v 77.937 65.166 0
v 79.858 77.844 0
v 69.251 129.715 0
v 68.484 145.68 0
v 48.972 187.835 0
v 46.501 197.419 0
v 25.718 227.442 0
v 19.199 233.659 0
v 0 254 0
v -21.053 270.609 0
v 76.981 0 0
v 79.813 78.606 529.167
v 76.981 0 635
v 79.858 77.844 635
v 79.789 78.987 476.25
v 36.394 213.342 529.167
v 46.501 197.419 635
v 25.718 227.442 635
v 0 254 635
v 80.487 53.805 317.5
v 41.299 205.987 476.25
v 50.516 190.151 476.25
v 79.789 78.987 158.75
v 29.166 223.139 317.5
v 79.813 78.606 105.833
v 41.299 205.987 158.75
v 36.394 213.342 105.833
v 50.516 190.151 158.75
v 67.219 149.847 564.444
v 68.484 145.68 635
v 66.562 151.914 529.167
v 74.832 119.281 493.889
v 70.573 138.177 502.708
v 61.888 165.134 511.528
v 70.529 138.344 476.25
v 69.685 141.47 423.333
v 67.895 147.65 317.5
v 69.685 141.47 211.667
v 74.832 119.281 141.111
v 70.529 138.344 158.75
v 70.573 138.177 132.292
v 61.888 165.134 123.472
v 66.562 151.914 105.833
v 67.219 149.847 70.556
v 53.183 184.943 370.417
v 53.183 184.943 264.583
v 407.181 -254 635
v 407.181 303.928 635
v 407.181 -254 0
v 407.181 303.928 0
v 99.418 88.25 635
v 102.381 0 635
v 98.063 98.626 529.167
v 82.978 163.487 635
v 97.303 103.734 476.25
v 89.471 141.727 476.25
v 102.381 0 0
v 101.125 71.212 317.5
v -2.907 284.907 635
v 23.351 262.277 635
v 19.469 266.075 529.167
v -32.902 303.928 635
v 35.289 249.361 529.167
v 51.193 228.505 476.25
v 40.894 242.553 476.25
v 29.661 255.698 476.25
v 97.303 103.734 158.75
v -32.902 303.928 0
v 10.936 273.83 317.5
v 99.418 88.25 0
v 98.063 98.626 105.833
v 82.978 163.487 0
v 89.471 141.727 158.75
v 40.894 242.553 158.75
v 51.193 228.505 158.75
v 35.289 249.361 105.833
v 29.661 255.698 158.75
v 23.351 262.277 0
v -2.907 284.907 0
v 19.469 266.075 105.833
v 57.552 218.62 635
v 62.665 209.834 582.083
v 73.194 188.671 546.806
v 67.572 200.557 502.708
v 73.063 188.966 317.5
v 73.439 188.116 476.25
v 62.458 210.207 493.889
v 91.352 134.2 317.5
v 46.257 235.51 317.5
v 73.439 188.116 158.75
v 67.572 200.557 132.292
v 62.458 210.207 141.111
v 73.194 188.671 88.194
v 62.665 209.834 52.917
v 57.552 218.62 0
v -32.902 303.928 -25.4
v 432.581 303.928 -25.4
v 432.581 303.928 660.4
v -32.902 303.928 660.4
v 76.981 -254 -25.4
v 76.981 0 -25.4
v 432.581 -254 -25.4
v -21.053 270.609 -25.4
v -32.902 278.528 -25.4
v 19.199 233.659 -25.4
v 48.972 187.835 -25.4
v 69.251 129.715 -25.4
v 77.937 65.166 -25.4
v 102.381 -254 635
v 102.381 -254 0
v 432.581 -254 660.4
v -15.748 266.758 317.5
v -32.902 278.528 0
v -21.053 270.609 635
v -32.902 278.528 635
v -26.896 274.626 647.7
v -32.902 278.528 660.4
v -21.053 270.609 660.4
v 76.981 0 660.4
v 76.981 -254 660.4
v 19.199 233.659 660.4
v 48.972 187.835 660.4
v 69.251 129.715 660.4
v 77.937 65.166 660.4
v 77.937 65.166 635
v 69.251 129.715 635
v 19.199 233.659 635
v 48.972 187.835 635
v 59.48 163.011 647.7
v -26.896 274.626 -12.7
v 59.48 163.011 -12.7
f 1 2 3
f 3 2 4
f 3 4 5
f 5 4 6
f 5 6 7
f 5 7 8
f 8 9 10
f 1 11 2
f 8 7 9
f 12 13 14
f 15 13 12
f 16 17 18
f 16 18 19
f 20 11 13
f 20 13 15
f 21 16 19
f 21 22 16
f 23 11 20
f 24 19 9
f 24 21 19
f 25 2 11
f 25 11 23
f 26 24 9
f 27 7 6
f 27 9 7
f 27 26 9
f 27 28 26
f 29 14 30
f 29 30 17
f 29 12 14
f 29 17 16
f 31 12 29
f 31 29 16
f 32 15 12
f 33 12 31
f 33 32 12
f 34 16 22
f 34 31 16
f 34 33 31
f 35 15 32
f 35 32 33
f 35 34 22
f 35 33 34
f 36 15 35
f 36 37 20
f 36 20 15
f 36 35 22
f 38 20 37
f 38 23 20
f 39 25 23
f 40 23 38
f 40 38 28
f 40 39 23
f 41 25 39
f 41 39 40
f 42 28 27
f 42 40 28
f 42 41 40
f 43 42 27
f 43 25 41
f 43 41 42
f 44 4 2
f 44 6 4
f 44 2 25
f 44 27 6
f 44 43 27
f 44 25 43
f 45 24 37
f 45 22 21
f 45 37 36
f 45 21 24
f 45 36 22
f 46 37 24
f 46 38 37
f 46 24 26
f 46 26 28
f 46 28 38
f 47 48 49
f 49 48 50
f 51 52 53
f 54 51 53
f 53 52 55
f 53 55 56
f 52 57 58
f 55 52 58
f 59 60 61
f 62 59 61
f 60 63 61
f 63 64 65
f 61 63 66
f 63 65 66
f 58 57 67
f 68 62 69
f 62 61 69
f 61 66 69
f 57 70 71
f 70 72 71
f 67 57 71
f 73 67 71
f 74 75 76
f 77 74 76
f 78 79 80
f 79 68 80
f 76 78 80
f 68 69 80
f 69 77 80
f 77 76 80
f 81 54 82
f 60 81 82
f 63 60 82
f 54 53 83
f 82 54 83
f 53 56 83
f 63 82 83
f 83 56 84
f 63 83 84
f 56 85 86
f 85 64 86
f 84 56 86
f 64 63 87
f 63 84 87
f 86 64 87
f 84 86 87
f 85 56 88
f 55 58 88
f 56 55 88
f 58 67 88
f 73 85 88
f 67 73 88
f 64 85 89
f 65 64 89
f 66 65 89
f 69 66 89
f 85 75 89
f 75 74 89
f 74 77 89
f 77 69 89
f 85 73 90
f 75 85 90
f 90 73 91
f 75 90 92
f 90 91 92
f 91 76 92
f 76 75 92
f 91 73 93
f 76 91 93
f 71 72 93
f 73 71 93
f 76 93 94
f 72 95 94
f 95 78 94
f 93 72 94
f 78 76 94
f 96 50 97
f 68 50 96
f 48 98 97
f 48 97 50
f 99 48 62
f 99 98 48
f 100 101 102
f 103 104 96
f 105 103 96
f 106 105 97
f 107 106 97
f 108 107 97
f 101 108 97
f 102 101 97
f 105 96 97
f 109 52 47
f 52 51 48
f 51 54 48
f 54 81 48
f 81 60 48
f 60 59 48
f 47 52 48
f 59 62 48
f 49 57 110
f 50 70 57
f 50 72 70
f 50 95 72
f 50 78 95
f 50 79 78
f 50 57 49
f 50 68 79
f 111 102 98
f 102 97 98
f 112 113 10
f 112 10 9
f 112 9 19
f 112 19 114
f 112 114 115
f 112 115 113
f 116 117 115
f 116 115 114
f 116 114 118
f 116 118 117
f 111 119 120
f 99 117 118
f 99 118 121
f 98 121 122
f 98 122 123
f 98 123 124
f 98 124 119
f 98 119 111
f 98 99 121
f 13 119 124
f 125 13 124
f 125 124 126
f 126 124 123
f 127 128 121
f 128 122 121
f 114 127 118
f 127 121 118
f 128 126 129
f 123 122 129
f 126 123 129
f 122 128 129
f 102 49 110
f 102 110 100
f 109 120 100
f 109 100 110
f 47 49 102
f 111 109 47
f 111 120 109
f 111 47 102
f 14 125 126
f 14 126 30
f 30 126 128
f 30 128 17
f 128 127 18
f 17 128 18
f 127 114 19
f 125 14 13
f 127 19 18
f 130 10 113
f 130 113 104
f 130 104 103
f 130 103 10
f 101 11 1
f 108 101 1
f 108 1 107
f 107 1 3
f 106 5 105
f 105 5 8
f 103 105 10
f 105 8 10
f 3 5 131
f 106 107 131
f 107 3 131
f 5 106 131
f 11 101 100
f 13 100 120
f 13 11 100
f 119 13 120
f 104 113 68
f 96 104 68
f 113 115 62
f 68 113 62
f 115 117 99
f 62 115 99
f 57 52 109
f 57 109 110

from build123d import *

# Parameters (mm, degrees)
SKETCH7_W               = 25.4
SKETCH7_H               = 303.92823255
BOSS_EXTRUDE2_DEPTH     = 635
BOSS_EXTRUDE2_2_DEPTH   = 635
SKETCH9_W               = 465.483389799
SKETCH9_H               = 303.92823255
BOSS_EXTRUDE3_DEPTH     = 25.4
SKETCH10_W              = 465.483389799
SKETCH10_H              = 303.92823255
BOSS_EXTRUDE4_DEPTH     = 25.4
CUT_EXTRUDE1_DEPTH      = 2380.234
CUT_EXTRUDE1_DEPTH_BACK = 125.476
SKETCH12_W              = 355.6
SKETCH12_H              = 685.8
BOSS_EXTRUDE5_DEPTH     = 254
SKETCH13_W              = 304.8
SKETCH13_H              = 635
CUT_EXTRUDE2_DEPTH      = 551.942


with BuildPart() as part:
    # Sketch7 → Boss-Extrude2 (new body)
    with BuildSketch(Plane.XY):
        with Locations((419.881001745, 151.964116275)):
            Rectangle(SKETCH7_W, SKETCH7_H)
    extrude(amount=BOSS_EXTRUDE2_DEPTH)



with BuildPart() as body_2:
    # Sketch7 → Boss-Extrude2 2 (new body)
    with BuildSketch(Plane.XY):
        with BuildLine():
            Line((-32.902388054, 303.92823255), (-32.902388054, 278.52823255))
            add(Edge.make_bspline(
                [(0, 254), (-15.04510801, 267.251537687), (-32.902388054, 278.52823255)],
                knots=[0.866081735, 0.866081735, 0.866081735, 1, 1, 1], degree=2))
            add(Edge.make_bspline(
                [(76.981001745, 0), (97.30034402, 168.299108064), (0, 254)],
                knots=[0, 0, 0, 0.866081735, 0.866081735, 0.866081735], degree=2))
            Line((76.981001745, 0), (102.381001745, 0))
            add(Edge.make_bspline(
                [(102.381001745, 0), (111.38603621, 225.968646172), (-32.902388054, 303.92823255)],
                knots=[0, 0, 0, 0.936348865, 0.936348865, 0.936348865], degree=2))
        make_face()
    extrude(amount=BOSS_EXTRUDE2_2_DEPTH)


with BuildPart() as part_1:
    add(part.part)

    add(body_2.part)  # Boss-Extrude3 merges body 2
    # Sketch9 → Boss-Extrude3 (add)
    with BuildSketch(Plane.XY.offset(635)):
        with Locations((199.839306846, 151.964116275)):
            Rectangle(SKETCH9_W, SKETCH9_H)
    extrude(amount=BOSS_EXTRUDE3_DEPTH)

    # Sketch10 → Boss-Extrude4 (add)
    with BuildSketch(Plane(origin=(0, 0, 0), x_dir=(-1, 0, 0), z_dir=(0, 0, -1))):
        with Locations((-199.839306846, 151.964116275)):
            Rectangle(SKETCH10_W, SKETCH10_H)
    extrude(amount=BOSS_EXTRUDE4_DEPTH)

    # Sketch11 → Cut-Extrude1 (cut, two sides: drawn at the far end of the back side and taken through both)
    with BuildSketch(Plane(origin=(0, 0, 635), x_dir=(-1, 0, 0), z_dir=(0, 0, -1)).offset(-CUT_EXTRUDE1_DEPTH_BACK)):
        with BuildLine():
            Line((32.902388054, 0), (32.902388054, 278.52823255))
            add(Edge.make_bspline(
                [(32.902388054, 278.52823255), (26.814117535, 274.683550229), (21.052735145, 270.6093113)],
                knots=[0, 0, 0, 0.045658164, 0.045658164, 0.045658164], degree=2))
            add(Edge.make_bspline(
                [(-76.981001745, 0), (-90.995301199, 190.717013874), (21.052735145, 270.6093113)],
                knots=[0, 0, 0, 0.870425908, 0.870425908, 0.870425908], degree=2))
            Line((-76.981001745, 0), (32.902388054, 0))
        make_face()
    extrude(amount=CUT_EXTRUDE1_DEPTH + CUT_EXTRUDE1_DEPTH_BACK, mode=Mode.SUBTRACT)

    # Sketch12 → Boss-Extrude5 (add)
    with BuildSketch(Plane.XZ):
        with Locations((254.781001745, 317.5)):
            Rectangle(SKETCH12_W, SKETCH12_H)
    extrude(amount=BOSS_EXTRUDE5_DEPTH)

    # Sketch13 → Cut-Extrude2 (cut)
    with BuildSketch(Plane(origin=(0, 0, 0), x_dir=(1, 0, 0), z_dir=(0, 1, 0))):
        with Locations((254.781001745, -317.5)):
            Rectangle(SKETCH13_W, SKETCH13_H)
    extrude(amount=-CUT_EXTRUDE2_DEPTH, mode=Mode.SUBTRACT)


solid = part_1.part
